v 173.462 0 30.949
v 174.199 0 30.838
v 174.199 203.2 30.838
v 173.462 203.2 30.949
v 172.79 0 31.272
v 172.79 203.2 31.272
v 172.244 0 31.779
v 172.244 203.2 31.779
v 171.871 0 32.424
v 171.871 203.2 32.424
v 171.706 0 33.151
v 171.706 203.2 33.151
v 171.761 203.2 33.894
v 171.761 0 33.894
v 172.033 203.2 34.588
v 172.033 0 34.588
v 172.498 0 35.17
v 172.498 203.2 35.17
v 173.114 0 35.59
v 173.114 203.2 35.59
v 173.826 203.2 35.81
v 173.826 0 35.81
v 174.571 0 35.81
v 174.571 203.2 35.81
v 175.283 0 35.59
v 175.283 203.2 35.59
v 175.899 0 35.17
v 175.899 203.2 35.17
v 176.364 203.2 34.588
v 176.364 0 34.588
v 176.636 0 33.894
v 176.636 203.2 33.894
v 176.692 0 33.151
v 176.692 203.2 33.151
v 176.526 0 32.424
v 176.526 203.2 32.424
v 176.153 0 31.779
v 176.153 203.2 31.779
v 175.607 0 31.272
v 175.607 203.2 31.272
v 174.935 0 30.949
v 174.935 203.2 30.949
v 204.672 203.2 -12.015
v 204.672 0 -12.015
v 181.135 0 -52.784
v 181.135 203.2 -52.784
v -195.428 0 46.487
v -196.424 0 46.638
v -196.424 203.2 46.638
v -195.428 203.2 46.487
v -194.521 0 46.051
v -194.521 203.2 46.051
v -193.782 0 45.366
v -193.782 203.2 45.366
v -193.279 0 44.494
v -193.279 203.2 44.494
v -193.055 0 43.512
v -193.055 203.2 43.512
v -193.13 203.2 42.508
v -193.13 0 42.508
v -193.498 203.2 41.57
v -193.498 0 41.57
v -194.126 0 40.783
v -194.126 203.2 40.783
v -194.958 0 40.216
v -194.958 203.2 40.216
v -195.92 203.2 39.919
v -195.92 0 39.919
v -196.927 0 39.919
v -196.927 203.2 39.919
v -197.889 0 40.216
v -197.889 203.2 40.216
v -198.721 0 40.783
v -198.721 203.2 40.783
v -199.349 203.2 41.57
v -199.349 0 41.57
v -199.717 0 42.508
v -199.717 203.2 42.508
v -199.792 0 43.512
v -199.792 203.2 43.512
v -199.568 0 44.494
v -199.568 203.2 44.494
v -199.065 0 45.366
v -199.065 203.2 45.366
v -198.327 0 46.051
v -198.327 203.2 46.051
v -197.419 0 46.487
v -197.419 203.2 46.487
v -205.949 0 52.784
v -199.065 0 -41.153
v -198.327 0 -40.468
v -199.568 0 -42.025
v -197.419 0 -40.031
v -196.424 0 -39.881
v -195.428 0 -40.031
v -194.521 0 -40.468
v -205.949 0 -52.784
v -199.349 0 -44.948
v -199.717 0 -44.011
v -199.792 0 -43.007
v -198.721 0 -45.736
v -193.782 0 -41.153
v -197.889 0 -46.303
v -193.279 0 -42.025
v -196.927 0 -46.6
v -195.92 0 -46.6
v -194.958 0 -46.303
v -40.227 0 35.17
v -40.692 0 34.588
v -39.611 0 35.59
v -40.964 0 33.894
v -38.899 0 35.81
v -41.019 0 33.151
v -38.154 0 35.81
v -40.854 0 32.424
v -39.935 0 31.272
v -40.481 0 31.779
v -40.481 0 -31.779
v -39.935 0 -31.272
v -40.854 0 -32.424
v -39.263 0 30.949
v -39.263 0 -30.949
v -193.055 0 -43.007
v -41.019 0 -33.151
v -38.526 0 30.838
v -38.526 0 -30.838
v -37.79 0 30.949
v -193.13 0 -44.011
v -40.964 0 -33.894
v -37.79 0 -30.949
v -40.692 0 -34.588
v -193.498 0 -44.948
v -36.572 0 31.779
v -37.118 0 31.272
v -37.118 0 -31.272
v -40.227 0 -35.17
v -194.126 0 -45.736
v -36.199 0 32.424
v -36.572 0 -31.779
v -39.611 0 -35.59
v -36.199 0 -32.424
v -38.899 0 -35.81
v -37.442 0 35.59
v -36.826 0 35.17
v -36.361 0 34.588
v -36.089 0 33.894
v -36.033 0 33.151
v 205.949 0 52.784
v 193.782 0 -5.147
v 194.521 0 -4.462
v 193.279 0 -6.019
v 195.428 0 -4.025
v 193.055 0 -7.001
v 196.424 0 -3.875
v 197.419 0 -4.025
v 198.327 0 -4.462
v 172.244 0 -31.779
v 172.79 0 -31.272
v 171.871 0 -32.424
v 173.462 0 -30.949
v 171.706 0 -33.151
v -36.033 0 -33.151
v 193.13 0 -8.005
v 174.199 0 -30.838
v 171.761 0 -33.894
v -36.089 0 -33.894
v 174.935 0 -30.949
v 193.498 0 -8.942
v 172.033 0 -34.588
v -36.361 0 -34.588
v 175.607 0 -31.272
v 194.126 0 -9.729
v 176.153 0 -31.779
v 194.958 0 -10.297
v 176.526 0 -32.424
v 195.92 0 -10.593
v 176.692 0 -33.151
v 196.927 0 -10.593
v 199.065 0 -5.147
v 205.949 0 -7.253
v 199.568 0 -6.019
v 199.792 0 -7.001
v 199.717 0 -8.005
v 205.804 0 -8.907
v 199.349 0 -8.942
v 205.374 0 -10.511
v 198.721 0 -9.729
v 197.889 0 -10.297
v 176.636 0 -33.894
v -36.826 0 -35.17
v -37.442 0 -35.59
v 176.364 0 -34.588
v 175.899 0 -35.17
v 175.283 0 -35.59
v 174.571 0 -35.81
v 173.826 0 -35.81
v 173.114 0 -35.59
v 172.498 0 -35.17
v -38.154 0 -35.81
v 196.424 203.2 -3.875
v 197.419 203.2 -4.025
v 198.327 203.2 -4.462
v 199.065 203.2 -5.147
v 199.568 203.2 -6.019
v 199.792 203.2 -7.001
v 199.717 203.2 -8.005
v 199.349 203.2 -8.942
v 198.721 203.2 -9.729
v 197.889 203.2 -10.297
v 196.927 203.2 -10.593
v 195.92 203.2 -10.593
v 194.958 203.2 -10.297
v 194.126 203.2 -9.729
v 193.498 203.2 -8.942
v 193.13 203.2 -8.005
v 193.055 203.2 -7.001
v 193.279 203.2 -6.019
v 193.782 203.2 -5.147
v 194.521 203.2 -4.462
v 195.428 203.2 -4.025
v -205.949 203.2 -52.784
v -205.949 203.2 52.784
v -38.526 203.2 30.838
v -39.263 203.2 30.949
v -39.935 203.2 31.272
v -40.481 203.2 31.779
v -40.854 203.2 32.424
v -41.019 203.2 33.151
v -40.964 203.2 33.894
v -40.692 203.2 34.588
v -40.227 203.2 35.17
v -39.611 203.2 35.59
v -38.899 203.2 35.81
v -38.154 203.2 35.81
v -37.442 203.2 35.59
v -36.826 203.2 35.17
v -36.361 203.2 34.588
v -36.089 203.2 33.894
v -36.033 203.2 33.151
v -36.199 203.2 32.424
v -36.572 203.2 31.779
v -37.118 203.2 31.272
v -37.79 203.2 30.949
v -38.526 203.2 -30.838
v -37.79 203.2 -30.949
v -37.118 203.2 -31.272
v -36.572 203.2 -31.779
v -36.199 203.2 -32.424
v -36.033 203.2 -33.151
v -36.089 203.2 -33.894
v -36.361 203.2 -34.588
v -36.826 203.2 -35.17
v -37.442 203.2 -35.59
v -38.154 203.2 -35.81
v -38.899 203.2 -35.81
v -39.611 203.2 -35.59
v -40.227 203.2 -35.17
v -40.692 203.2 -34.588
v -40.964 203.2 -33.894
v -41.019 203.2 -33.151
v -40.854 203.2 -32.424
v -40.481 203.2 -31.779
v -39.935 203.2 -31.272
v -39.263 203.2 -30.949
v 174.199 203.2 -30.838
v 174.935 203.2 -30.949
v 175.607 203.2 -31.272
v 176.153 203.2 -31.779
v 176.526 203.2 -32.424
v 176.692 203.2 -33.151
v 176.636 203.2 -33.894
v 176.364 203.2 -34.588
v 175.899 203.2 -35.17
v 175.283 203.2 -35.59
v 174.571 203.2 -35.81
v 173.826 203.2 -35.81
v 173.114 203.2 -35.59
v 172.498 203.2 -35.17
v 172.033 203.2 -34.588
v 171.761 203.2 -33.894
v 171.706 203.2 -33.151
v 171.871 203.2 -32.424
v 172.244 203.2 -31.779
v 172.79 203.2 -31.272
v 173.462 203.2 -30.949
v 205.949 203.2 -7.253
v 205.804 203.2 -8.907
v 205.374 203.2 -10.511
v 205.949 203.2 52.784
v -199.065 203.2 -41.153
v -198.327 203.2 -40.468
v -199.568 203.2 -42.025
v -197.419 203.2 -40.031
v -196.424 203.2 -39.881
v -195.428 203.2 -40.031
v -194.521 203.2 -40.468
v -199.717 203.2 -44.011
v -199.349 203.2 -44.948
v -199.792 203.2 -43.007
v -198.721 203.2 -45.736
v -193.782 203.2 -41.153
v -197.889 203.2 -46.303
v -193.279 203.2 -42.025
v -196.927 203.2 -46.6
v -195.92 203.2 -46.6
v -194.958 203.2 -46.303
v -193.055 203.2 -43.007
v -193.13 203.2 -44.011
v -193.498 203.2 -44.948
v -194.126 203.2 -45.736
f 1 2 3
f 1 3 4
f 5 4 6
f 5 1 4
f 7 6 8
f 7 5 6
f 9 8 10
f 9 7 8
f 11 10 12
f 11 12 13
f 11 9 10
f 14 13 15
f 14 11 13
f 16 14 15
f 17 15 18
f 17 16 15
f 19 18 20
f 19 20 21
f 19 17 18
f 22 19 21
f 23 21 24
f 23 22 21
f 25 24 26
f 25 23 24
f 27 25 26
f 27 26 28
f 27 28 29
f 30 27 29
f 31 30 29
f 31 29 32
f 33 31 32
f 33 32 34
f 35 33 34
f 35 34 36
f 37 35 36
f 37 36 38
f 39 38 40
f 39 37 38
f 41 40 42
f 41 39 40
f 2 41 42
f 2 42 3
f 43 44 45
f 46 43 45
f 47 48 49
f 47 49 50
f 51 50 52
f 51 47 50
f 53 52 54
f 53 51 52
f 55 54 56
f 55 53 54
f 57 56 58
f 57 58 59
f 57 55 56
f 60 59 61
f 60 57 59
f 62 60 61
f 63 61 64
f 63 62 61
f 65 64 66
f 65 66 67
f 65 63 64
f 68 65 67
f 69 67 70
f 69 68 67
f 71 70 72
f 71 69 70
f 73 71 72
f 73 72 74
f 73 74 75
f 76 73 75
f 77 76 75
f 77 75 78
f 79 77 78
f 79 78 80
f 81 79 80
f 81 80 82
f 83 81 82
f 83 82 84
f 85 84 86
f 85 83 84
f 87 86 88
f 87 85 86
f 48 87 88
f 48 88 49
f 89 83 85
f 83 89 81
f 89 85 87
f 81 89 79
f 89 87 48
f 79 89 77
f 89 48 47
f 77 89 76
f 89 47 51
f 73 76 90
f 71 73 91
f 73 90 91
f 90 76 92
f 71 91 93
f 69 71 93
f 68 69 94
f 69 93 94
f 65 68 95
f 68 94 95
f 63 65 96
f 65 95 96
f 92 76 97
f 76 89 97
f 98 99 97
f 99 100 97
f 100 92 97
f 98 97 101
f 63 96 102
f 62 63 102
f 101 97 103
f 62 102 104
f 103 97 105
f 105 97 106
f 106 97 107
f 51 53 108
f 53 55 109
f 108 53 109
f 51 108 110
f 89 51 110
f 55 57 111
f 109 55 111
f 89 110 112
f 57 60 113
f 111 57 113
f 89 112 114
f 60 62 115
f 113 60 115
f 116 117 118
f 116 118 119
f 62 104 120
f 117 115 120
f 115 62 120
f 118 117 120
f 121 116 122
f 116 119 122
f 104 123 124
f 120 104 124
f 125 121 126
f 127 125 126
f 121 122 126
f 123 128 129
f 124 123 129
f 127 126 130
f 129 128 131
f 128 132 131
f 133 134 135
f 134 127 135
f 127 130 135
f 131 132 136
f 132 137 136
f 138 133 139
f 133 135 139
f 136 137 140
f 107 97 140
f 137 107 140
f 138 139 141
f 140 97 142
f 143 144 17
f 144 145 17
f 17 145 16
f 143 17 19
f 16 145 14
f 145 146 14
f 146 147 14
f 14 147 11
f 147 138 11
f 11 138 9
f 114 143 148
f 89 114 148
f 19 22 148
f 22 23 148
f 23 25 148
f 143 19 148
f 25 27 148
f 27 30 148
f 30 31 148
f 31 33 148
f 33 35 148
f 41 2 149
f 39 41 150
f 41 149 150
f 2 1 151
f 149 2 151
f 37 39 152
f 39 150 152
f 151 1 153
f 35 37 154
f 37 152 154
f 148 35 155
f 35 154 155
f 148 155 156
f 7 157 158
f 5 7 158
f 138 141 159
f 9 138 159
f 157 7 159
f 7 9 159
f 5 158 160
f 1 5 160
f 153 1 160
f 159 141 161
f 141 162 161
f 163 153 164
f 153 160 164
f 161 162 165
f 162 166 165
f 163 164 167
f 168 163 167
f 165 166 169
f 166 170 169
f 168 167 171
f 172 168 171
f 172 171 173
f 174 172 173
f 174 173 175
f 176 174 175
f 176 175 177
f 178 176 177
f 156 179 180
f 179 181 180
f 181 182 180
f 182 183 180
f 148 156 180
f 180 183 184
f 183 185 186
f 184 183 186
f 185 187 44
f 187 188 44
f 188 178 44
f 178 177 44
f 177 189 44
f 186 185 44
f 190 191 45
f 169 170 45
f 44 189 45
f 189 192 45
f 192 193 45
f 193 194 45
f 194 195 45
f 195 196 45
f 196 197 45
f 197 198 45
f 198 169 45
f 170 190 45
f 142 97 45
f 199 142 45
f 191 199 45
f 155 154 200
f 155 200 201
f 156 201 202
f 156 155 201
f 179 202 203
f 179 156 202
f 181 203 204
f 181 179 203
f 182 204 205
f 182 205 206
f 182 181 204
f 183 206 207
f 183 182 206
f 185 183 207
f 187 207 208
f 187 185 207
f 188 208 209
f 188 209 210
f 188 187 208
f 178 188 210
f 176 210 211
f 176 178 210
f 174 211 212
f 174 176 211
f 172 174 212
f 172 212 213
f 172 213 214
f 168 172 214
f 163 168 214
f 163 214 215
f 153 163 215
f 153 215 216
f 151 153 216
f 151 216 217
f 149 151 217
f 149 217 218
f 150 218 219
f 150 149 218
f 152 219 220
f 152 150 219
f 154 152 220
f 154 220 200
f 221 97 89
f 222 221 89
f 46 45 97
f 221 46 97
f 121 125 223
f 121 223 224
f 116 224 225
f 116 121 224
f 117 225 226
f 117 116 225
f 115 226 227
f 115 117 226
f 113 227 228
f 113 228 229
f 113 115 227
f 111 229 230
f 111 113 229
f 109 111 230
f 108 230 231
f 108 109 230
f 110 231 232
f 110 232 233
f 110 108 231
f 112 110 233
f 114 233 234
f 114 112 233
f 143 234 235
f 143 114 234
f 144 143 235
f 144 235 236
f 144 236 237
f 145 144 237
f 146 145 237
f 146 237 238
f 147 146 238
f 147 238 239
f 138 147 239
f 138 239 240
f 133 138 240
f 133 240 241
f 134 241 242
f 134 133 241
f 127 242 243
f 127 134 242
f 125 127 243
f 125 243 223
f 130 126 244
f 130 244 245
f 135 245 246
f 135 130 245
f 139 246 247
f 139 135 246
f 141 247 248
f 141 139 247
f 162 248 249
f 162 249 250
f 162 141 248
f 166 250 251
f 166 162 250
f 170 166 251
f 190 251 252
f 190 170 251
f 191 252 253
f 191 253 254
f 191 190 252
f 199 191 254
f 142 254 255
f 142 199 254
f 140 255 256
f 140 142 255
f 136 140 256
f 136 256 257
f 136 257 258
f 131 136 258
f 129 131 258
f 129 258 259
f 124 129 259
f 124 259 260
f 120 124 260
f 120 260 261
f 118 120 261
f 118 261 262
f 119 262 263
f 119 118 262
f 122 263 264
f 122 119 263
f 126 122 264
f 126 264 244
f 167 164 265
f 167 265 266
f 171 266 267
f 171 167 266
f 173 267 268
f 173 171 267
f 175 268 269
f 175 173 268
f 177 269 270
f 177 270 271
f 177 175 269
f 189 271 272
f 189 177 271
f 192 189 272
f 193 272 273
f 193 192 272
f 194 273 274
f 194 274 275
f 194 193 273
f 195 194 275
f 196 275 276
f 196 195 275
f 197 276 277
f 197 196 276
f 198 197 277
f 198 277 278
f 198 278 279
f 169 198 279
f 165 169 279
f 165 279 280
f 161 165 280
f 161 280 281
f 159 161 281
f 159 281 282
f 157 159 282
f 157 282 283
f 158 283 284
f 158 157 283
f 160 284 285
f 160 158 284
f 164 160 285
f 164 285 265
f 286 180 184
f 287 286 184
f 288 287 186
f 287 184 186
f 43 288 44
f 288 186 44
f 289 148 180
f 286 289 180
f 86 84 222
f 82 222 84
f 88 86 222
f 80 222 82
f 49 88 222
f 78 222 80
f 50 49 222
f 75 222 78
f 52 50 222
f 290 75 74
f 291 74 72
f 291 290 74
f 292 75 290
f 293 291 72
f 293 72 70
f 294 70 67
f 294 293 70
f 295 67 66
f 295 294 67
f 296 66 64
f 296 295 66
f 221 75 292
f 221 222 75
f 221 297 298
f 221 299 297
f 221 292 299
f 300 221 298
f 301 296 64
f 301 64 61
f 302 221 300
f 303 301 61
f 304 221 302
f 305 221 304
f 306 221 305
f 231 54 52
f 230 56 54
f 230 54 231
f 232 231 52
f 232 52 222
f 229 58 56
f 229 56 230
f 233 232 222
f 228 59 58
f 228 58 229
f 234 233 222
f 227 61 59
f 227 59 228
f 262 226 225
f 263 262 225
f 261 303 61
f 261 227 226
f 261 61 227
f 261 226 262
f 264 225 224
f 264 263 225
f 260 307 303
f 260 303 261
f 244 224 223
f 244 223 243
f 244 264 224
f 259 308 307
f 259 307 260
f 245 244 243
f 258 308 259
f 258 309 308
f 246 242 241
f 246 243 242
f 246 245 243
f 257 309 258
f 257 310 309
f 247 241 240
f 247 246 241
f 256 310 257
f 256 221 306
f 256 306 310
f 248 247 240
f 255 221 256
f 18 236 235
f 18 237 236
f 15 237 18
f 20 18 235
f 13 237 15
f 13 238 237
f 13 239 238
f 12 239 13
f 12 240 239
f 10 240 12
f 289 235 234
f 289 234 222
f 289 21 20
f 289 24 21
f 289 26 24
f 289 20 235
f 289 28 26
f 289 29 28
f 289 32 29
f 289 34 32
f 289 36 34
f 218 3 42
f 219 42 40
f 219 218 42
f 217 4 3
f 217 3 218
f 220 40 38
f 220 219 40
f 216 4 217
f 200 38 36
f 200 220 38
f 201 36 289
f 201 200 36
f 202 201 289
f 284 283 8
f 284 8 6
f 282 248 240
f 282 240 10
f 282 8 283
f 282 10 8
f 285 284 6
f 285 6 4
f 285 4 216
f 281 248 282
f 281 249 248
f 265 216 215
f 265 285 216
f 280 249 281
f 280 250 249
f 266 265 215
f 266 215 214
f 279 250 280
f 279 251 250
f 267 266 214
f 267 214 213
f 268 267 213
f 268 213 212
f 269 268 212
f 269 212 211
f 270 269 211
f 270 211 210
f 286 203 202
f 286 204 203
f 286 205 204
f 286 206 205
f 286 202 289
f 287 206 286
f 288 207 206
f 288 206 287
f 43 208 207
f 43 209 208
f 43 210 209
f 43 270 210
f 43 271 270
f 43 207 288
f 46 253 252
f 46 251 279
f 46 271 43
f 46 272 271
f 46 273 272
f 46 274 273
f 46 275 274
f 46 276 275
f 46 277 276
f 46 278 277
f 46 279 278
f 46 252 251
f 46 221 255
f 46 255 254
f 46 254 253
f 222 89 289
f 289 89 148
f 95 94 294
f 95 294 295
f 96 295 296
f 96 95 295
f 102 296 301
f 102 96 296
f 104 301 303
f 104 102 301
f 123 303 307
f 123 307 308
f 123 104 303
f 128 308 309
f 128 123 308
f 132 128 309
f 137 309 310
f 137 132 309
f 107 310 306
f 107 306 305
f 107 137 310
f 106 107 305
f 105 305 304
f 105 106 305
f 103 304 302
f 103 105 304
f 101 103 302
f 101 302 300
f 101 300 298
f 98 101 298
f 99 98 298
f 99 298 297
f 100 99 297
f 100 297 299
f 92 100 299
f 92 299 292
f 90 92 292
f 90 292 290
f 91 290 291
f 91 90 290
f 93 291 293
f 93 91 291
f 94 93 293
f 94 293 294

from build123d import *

# Parameters (mm, degrees)
SKETCH1_R           = 3.3782
SKETCH1_R_2         = 2.5
BOSS_EXTRUDE1_DEPTH = 203.2


with BuildPart() as part:
    # Sketch1 → Boss-Extrude1 (new body)
    with BuildSketch(Plane(origin=(0, 0, 0), x_dir=(1, 0, 0), z_dir=(0, 1, 0))):
        with BuildLine():
            Line((-205.948559195, -52.784375), (205.948559195, -52.784375))
            Line((205.948559195, -52.784375), (205.948559195, 7.252981651))
            ThreePointArc((205.948559195, 7.252981651), (205.62400269, 9.718233056), (204.672451166, 12.015481651))
            Line((204.672451166, 12.015481651), (181.134519617, 52.784375))
            Line((181.134519617, 52.784375), (-205.948559195, 52.784375))
            Line((-205.948559195, 52.784375), (-205.948559195, -52.784375))
        make_face()
        with Locations(Location((-196.423559195, 43.259375, 0), (0, 0, 270))):
            Circle(SKETCH1_R, mode=Mode.SUBTRACT)
        with Locations(Location((-196.423559195, -43.259375, 0), (0, 0, 270))):
            Circle(SKETCH1_R, mode=Mode.SUBTRACT)
        with Locations(Location((196.423559195, 7.252981651, 0), (0, 0, 270))):
            Circle(SKETCH1_R, mode=Mode.SUBTRACT)
        with Locations(Location((174.198559195, 33.3375, 0), (0, 0, 270))):
            Circle(SKETCH1_R_2, mode=Mode.SUBTRACT)
        with Locations(Location((-38.526440805, 33.3375, 0), (0, 0, 270))):
            Circle(SKETCH1_R_2, mode=Mode.SUBTRACT)
        with Locations(Location((-38.526440805, -33.3375, 0), (0, 0, 90))):
            Circle(SKETCH1_R_2, mode=Mode.SUBTRACT)
        with Locations(Location((174.198559195, -33.3375, 0), (0, 0, 90))):
            Circle(SKETCH1_R_2, mode=Mode.SUBTRACT)
    extrude(amount=BOSS_EXTRUDE1_DEPTH)


solid = part.part
